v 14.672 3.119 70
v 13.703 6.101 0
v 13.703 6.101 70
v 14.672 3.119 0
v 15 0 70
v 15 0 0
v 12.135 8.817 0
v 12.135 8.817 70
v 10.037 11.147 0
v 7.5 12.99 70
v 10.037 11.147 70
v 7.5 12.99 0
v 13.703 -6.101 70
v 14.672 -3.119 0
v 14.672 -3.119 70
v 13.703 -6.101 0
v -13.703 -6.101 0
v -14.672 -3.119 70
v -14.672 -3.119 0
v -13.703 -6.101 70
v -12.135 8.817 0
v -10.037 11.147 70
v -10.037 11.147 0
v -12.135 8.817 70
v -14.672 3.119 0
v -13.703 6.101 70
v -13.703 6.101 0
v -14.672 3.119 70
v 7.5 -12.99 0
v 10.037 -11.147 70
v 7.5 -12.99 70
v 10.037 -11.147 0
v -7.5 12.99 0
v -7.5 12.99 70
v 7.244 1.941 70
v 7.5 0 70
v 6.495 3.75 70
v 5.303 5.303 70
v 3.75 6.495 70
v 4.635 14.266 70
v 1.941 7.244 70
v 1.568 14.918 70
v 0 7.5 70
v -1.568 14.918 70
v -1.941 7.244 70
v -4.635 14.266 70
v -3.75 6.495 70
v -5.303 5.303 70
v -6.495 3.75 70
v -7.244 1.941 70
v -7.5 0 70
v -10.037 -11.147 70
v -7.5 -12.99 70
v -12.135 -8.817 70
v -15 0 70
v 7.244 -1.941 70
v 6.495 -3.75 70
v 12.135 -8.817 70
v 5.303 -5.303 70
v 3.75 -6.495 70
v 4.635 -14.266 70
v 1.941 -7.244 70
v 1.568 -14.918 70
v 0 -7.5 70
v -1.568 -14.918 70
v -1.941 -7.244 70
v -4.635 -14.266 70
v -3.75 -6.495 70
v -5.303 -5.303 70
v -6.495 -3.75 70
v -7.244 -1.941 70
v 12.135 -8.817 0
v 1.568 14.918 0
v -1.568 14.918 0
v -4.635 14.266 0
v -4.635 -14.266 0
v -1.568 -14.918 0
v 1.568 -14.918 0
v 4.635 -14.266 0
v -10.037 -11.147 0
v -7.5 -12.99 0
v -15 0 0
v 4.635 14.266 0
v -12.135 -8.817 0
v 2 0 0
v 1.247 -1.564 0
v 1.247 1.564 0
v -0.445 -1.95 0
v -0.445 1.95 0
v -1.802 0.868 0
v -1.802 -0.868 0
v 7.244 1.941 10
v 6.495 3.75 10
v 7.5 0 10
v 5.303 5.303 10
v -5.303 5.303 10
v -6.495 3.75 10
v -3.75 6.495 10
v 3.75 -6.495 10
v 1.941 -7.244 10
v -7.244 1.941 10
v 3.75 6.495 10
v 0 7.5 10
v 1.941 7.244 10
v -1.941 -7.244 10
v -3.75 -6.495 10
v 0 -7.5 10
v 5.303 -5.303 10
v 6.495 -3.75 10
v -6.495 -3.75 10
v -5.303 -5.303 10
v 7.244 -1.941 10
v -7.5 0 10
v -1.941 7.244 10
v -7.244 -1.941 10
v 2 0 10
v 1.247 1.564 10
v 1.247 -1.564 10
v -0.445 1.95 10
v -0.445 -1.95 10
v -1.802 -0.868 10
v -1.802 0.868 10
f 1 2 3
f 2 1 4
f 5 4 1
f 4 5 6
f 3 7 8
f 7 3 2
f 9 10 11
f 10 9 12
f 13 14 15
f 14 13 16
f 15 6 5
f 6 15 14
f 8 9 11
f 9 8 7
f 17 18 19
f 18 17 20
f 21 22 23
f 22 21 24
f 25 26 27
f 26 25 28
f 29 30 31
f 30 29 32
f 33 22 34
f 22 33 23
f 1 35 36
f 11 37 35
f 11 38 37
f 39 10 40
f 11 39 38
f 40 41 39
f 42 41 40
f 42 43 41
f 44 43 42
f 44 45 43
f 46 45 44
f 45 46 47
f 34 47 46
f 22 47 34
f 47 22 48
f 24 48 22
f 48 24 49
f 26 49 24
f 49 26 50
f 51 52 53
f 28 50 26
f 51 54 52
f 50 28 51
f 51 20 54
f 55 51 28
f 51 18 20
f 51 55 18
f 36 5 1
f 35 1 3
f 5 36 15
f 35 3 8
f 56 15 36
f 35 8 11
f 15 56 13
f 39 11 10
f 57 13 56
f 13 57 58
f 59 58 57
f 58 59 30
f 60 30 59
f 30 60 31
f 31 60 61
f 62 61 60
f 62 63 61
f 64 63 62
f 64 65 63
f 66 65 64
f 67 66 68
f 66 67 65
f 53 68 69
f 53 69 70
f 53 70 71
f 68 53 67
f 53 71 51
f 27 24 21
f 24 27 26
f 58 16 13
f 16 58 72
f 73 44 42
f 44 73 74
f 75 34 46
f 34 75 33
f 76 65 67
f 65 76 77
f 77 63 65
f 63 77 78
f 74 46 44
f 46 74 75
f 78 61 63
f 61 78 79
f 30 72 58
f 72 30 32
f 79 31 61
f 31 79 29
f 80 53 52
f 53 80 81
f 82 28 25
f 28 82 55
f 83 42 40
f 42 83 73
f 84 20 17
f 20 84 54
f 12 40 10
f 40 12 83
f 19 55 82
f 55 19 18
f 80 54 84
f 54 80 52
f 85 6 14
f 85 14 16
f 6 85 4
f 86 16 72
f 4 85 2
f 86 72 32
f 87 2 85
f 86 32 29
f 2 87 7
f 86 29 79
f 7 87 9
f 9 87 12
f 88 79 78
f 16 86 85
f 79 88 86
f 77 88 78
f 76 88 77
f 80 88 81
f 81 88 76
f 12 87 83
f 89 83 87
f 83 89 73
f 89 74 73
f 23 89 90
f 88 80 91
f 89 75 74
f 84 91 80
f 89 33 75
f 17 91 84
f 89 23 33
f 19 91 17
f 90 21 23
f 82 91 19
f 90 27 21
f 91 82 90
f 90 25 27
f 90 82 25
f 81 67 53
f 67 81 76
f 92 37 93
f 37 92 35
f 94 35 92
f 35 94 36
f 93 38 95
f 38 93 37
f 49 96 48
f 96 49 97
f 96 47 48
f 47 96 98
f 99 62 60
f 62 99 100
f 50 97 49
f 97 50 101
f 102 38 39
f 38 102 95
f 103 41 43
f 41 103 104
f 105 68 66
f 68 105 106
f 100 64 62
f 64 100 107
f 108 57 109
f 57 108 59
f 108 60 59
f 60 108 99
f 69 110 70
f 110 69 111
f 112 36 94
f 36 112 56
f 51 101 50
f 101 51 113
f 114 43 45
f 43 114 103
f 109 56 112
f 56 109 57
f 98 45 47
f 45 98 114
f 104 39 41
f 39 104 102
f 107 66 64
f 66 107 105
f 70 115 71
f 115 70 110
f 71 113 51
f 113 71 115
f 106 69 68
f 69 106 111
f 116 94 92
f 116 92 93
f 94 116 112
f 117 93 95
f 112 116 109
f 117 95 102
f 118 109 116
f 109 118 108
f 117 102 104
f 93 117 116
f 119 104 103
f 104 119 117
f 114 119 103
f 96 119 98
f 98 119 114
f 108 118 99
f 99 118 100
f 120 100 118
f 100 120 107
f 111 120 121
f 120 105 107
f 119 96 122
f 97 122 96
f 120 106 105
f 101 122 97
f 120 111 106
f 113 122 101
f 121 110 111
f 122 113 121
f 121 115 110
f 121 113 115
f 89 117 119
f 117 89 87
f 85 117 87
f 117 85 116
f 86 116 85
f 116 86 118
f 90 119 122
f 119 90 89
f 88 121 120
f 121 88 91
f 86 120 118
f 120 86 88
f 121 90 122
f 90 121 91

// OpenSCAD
screwDiameter = 4;
screwHeadDiameter = 15;
pegDiameter = 30;
pegLength = 70;
screwDepth = 10;
knobLength = 20;
knobDiameter = 40;

difference(){
    union(){
        cylinder(h=pegLength, d=pegDiameter);
        //translate([0,0,pegLength-1]) cylinder(h=knobLength,d=knobDiameter);
    }
    translate([0,0,screwDepth]) cylinder(h=knobLength+pegLength-screwDepth,d=screwHeadDiameter);
    translate([0,0,-1]) cylinder(h=screwDepth+1,d=screwDiameter);
}
